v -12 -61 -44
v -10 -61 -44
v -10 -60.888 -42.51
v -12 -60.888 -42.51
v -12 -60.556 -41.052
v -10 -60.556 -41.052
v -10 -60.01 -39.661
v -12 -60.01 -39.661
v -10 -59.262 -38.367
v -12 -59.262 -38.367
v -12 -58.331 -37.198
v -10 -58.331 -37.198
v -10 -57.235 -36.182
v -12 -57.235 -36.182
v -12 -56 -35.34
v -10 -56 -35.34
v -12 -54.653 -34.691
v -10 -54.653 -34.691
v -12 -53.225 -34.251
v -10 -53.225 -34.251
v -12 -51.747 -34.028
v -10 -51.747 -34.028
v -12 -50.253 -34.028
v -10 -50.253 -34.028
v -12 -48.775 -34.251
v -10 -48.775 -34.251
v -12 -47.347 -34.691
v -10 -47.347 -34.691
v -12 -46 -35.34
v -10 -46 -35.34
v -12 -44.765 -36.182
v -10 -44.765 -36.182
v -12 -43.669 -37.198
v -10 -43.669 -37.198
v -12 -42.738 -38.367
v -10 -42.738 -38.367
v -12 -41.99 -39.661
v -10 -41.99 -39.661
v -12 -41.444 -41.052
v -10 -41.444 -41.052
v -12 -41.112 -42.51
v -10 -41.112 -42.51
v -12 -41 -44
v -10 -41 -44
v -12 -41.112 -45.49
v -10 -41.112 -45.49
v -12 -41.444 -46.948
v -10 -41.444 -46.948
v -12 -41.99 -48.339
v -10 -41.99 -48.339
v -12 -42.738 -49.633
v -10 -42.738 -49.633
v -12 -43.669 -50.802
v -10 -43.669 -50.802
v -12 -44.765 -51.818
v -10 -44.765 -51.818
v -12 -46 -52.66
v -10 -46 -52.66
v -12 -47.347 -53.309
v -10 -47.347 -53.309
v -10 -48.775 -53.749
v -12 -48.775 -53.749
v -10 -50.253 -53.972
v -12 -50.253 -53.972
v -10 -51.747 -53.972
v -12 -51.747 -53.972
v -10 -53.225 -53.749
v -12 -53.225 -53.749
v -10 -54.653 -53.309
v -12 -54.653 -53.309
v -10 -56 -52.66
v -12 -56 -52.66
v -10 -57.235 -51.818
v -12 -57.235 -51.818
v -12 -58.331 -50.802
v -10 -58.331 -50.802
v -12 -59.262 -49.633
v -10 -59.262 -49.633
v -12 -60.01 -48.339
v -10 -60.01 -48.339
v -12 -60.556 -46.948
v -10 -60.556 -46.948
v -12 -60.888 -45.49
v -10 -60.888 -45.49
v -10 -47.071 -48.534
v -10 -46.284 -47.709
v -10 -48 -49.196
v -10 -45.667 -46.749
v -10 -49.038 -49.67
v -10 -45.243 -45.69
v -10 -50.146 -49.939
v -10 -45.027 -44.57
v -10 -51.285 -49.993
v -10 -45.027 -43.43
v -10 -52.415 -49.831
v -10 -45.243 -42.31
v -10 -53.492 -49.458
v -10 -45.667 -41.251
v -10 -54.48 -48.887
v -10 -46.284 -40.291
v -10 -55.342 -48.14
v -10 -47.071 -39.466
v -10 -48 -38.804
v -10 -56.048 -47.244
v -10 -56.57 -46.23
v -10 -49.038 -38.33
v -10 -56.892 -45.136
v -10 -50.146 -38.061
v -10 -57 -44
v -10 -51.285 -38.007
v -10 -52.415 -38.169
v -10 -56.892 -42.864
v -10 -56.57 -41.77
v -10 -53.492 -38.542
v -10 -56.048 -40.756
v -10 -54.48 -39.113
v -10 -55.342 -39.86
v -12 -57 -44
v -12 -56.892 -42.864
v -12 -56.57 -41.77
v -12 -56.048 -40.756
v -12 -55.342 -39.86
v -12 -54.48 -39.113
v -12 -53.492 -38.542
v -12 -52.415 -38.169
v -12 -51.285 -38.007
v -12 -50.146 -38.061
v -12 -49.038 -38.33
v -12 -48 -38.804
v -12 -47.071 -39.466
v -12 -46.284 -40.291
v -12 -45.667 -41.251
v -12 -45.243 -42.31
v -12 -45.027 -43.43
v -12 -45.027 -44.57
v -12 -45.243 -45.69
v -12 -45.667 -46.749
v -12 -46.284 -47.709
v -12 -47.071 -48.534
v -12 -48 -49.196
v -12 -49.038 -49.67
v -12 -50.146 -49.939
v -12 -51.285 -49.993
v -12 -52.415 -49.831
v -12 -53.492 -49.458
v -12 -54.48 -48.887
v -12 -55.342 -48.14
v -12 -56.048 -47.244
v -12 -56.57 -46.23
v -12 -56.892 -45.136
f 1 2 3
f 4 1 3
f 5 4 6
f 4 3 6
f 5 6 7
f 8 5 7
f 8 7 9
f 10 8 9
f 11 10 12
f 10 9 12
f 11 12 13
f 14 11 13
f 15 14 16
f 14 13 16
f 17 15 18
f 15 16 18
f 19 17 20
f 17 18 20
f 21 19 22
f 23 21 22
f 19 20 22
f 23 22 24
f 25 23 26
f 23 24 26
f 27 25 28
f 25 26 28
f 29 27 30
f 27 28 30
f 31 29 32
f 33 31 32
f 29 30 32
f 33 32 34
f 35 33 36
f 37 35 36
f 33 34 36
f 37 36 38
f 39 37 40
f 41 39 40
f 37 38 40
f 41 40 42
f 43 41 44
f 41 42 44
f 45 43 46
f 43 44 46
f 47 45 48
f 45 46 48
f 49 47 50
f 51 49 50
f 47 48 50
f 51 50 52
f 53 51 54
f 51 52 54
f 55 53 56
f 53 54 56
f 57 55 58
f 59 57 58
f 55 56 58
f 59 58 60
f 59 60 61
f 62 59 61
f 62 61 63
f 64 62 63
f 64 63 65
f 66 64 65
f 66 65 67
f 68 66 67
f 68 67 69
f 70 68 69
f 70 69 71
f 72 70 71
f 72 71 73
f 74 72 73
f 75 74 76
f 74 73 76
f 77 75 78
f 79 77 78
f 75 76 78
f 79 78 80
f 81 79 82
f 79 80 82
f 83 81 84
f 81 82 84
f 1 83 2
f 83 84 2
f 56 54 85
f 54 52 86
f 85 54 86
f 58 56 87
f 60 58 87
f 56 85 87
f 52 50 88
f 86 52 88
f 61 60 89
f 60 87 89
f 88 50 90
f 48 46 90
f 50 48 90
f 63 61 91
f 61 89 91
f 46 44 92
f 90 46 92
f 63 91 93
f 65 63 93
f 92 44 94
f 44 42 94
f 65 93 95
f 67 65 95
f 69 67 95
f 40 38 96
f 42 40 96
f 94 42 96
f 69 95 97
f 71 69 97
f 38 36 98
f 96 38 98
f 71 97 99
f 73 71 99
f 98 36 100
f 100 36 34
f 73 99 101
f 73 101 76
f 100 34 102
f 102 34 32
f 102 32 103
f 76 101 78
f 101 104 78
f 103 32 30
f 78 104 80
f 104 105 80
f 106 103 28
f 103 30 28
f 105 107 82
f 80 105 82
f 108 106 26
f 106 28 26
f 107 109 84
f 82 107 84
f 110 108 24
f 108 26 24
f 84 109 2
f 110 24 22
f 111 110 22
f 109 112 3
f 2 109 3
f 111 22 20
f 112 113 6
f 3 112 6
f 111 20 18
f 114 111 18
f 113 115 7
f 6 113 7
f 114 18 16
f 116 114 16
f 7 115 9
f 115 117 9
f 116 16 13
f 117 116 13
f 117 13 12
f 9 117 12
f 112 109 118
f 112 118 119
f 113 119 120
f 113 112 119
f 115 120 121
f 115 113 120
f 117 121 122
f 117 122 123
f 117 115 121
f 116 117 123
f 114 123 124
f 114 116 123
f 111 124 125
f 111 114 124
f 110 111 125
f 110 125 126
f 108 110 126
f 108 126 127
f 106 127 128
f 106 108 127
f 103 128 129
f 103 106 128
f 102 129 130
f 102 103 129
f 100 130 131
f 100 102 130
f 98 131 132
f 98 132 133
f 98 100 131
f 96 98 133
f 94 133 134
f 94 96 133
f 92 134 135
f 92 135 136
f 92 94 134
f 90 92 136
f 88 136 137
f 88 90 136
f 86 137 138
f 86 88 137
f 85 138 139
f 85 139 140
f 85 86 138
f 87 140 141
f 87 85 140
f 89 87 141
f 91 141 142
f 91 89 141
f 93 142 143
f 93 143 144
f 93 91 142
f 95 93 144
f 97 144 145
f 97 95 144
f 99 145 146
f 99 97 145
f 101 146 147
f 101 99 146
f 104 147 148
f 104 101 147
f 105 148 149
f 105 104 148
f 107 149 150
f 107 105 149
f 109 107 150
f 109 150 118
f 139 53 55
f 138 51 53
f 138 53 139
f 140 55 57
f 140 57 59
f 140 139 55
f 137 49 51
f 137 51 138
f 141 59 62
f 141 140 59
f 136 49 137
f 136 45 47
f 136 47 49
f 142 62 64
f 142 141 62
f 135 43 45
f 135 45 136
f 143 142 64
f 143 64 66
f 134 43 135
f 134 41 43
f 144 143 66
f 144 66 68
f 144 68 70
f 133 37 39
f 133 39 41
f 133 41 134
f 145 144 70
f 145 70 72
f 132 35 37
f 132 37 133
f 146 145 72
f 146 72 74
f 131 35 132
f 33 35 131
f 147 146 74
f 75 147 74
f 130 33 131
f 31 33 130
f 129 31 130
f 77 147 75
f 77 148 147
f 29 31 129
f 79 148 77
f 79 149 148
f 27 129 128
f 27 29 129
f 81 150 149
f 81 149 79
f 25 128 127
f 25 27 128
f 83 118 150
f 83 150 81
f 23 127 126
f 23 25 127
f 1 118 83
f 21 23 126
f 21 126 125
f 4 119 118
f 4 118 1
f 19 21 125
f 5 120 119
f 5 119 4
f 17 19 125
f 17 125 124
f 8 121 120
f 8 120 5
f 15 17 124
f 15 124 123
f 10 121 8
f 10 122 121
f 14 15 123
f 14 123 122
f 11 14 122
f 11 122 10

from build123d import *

# Parameters (mm, degrees)
SKETCH038_R   = 10
SKETCH038_R_2 = 6
PAD014_DEPTH  = 2


with BuildPart() as bearing_inner_back_left:
    # Sketch038 → Pad014 (new body)
    with BuildSketch(Plane.YZ):
        Circle(SKETCH038_R)
        Circle(SKETCH038_R_2, mode=Mode.SUBTRACT)
    extrude(amount=PAD014_DEPTH)


with BuildPart() as bearing_inner_back_left_1:
    # Body010 placement: moved
    add(bearing_inner_back_left.part.moved(Location((10, 51, -44))))


with BuildPart() as bearing_inner_front_left:
    # Part__Mirroring010: instance of bearing-inner-back-left
    add(bearing_inner_back_left_1.part.mirror(Plane(origin=(11, -4e-06, -44.000004), x_dir=(1, 0, 0), z_dir=(0, 1, 0))))


with BuildPart() as bearing_inner_front_right:
    # Part__Mirroring011: instance of bearing-inner-front-left
    add(bearing_inner_front_left.part.mirror(Plane(origin=(0, 0, 0), x_dir=(0, -1, 0), z_dir=(1, 0, 0))))


solid = bearing_inner_front_right.part
